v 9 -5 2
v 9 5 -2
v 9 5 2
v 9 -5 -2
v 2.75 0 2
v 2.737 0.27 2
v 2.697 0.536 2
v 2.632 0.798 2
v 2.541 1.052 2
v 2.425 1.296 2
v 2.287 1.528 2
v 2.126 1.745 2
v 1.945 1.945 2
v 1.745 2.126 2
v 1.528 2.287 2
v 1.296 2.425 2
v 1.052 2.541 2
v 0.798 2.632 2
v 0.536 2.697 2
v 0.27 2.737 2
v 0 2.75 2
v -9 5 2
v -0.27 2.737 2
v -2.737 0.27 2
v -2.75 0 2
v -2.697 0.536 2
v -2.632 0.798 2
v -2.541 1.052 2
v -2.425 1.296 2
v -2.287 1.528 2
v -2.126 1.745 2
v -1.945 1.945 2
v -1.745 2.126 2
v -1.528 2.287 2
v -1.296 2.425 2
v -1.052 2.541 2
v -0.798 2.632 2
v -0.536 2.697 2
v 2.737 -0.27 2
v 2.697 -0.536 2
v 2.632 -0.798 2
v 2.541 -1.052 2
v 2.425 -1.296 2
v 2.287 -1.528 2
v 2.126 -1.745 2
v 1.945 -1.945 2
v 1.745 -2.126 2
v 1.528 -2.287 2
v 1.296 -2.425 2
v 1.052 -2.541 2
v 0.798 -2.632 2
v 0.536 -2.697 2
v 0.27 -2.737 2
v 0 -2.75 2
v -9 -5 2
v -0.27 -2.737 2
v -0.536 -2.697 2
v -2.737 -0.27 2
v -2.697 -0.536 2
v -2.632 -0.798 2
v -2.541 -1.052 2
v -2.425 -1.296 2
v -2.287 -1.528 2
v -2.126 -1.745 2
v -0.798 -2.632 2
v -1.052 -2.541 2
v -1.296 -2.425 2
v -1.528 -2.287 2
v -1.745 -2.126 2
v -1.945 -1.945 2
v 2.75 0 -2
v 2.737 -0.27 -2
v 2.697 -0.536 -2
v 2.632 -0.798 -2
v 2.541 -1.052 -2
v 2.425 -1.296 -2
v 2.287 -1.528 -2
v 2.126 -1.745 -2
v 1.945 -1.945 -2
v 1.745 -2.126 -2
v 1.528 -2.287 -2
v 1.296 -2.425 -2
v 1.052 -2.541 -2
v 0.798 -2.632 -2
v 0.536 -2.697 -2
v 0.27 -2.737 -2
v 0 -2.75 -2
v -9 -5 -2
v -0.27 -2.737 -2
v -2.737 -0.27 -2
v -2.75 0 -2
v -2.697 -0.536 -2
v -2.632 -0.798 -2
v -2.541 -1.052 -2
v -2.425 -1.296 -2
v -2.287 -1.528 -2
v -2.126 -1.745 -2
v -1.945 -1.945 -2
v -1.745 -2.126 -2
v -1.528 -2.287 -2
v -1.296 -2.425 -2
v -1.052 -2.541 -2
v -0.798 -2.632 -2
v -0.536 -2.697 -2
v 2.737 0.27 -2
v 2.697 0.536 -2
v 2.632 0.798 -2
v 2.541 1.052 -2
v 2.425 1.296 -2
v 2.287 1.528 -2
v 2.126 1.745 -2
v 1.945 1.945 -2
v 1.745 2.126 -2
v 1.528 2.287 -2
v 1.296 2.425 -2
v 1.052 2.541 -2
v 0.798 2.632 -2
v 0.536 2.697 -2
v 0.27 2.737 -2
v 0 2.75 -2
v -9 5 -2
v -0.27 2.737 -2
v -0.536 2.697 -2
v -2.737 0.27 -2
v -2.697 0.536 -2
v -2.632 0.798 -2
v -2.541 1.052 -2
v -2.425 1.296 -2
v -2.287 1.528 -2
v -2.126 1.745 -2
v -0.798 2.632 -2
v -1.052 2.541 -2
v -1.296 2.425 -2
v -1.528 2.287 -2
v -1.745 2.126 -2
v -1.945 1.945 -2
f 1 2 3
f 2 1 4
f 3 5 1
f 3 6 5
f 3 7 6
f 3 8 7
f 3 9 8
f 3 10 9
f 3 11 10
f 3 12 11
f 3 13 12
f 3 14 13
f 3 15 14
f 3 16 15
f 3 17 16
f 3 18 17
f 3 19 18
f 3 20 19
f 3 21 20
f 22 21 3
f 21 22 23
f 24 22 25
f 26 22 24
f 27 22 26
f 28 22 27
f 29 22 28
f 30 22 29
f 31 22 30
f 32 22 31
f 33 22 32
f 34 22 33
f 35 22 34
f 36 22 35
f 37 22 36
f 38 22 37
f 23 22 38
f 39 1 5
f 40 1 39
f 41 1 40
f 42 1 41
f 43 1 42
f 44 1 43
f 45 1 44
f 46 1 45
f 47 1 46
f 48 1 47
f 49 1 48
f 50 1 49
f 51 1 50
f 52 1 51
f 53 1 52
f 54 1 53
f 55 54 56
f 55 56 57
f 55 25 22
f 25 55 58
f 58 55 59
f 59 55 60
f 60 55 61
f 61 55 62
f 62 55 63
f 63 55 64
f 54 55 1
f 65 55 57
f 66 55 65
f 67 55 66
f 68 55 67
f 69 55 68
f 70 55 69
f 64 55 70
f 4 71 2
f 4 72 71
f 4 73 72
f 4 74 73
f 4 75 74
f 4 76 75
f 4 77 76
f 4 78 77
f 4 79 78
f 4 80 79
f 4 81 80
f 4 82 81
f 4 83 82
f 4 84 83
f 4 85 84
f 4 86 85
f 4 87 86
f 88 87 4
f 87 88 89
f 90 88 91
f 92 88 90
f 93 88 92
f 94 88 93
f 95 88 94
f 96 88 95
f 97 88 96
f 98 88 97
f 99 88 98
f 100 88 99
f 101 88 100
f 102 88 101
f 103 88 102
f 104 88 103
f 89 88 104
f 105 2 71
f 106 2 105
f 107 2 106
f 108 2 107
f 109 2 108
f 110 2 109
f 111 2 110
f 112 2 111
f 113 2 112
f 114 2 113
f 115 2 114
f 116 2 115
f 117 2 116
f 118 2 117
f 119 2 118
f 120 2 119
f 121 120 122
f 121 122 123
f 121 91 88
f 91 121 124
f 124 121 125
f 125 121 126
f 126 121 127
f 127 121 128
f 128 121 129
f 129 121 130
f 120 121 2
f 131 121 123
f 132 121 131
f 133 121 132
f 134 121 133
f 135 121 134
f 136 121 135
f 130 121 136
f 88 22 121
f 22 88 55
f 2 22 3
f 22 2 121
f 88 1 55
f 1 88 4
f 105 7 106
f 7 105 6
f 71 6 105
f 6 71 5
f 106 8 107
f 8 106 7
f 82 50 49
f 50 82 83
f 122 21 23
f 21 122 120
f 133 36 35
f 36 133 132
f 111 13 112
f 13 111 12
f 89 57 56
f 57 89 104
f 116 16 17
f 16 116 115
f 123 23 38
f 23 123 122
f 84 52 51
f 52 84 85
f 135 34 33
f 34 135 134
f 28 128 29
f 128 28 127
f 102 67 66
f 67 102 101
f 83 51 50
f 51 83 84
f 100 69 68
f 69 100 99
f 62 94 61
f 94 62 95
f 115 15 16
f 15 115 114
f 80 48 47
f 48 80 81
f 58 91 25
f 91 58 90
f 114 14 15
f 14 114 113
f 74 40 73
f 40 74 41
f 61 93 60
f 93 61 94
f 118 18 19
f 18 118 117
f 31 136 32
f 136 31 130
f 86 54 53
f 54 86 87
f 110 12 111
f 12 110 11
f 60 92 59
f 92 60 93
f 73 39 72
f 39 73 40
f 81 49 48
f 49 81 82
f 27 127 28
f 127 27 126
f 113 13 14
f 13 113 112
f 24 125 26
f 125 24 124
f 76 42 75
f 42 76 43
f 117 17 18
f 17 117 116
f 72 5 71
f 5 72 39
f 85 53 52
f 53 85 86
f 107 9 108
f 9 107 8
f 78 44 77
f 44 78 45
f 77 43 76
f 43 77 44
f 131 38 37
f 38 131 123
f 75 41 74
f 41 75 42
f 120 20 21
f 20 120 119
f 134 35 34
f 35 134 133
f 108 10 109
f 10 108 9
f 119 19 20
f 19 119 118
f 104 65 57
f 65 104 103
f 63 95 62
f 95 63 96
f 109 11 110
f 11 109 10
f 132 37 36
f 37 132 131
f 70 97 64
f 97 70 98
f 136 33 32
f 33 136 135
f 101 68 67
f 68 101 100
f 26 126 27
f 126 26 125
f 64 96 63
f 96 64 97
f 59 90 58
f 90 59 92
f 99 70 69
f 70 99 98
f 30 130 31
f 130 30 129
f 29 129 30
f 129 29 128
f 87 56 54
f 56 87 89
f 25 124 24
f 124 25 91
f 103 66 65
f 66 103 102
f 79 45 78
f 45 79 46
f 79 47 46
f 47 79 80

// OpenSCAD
// Parametric Source File for: snap clips
// Generated via Sol-5.6-Max-PyOrch CAD Agent
// Component ID: COMP-BD4146
// Material hint: TPU | Mechanical profile: compliant
// Suggested wall_loops from DFM: 3

$fn = 64; // Render resolution
hole_compensation = 0.25; // Dynamic FDM printer gap adjustment

body_w = 18.0;
body_d = 10.0;
body_h = 4.0;
bore_r = 2.5;

module generate_snap_clips_model() {
    difference() {
        // Core structural bounding hull (parametric)
        cube([body_w, body_d, body_h], center = true);

        // Dynamic interlocking peg / clearance track
        translate([0, 0, 0])
            cylinder(h = body_h + 2, r = bore_r + hole_compensation, center = true);
    }
}

generate_snap_clips_model();
